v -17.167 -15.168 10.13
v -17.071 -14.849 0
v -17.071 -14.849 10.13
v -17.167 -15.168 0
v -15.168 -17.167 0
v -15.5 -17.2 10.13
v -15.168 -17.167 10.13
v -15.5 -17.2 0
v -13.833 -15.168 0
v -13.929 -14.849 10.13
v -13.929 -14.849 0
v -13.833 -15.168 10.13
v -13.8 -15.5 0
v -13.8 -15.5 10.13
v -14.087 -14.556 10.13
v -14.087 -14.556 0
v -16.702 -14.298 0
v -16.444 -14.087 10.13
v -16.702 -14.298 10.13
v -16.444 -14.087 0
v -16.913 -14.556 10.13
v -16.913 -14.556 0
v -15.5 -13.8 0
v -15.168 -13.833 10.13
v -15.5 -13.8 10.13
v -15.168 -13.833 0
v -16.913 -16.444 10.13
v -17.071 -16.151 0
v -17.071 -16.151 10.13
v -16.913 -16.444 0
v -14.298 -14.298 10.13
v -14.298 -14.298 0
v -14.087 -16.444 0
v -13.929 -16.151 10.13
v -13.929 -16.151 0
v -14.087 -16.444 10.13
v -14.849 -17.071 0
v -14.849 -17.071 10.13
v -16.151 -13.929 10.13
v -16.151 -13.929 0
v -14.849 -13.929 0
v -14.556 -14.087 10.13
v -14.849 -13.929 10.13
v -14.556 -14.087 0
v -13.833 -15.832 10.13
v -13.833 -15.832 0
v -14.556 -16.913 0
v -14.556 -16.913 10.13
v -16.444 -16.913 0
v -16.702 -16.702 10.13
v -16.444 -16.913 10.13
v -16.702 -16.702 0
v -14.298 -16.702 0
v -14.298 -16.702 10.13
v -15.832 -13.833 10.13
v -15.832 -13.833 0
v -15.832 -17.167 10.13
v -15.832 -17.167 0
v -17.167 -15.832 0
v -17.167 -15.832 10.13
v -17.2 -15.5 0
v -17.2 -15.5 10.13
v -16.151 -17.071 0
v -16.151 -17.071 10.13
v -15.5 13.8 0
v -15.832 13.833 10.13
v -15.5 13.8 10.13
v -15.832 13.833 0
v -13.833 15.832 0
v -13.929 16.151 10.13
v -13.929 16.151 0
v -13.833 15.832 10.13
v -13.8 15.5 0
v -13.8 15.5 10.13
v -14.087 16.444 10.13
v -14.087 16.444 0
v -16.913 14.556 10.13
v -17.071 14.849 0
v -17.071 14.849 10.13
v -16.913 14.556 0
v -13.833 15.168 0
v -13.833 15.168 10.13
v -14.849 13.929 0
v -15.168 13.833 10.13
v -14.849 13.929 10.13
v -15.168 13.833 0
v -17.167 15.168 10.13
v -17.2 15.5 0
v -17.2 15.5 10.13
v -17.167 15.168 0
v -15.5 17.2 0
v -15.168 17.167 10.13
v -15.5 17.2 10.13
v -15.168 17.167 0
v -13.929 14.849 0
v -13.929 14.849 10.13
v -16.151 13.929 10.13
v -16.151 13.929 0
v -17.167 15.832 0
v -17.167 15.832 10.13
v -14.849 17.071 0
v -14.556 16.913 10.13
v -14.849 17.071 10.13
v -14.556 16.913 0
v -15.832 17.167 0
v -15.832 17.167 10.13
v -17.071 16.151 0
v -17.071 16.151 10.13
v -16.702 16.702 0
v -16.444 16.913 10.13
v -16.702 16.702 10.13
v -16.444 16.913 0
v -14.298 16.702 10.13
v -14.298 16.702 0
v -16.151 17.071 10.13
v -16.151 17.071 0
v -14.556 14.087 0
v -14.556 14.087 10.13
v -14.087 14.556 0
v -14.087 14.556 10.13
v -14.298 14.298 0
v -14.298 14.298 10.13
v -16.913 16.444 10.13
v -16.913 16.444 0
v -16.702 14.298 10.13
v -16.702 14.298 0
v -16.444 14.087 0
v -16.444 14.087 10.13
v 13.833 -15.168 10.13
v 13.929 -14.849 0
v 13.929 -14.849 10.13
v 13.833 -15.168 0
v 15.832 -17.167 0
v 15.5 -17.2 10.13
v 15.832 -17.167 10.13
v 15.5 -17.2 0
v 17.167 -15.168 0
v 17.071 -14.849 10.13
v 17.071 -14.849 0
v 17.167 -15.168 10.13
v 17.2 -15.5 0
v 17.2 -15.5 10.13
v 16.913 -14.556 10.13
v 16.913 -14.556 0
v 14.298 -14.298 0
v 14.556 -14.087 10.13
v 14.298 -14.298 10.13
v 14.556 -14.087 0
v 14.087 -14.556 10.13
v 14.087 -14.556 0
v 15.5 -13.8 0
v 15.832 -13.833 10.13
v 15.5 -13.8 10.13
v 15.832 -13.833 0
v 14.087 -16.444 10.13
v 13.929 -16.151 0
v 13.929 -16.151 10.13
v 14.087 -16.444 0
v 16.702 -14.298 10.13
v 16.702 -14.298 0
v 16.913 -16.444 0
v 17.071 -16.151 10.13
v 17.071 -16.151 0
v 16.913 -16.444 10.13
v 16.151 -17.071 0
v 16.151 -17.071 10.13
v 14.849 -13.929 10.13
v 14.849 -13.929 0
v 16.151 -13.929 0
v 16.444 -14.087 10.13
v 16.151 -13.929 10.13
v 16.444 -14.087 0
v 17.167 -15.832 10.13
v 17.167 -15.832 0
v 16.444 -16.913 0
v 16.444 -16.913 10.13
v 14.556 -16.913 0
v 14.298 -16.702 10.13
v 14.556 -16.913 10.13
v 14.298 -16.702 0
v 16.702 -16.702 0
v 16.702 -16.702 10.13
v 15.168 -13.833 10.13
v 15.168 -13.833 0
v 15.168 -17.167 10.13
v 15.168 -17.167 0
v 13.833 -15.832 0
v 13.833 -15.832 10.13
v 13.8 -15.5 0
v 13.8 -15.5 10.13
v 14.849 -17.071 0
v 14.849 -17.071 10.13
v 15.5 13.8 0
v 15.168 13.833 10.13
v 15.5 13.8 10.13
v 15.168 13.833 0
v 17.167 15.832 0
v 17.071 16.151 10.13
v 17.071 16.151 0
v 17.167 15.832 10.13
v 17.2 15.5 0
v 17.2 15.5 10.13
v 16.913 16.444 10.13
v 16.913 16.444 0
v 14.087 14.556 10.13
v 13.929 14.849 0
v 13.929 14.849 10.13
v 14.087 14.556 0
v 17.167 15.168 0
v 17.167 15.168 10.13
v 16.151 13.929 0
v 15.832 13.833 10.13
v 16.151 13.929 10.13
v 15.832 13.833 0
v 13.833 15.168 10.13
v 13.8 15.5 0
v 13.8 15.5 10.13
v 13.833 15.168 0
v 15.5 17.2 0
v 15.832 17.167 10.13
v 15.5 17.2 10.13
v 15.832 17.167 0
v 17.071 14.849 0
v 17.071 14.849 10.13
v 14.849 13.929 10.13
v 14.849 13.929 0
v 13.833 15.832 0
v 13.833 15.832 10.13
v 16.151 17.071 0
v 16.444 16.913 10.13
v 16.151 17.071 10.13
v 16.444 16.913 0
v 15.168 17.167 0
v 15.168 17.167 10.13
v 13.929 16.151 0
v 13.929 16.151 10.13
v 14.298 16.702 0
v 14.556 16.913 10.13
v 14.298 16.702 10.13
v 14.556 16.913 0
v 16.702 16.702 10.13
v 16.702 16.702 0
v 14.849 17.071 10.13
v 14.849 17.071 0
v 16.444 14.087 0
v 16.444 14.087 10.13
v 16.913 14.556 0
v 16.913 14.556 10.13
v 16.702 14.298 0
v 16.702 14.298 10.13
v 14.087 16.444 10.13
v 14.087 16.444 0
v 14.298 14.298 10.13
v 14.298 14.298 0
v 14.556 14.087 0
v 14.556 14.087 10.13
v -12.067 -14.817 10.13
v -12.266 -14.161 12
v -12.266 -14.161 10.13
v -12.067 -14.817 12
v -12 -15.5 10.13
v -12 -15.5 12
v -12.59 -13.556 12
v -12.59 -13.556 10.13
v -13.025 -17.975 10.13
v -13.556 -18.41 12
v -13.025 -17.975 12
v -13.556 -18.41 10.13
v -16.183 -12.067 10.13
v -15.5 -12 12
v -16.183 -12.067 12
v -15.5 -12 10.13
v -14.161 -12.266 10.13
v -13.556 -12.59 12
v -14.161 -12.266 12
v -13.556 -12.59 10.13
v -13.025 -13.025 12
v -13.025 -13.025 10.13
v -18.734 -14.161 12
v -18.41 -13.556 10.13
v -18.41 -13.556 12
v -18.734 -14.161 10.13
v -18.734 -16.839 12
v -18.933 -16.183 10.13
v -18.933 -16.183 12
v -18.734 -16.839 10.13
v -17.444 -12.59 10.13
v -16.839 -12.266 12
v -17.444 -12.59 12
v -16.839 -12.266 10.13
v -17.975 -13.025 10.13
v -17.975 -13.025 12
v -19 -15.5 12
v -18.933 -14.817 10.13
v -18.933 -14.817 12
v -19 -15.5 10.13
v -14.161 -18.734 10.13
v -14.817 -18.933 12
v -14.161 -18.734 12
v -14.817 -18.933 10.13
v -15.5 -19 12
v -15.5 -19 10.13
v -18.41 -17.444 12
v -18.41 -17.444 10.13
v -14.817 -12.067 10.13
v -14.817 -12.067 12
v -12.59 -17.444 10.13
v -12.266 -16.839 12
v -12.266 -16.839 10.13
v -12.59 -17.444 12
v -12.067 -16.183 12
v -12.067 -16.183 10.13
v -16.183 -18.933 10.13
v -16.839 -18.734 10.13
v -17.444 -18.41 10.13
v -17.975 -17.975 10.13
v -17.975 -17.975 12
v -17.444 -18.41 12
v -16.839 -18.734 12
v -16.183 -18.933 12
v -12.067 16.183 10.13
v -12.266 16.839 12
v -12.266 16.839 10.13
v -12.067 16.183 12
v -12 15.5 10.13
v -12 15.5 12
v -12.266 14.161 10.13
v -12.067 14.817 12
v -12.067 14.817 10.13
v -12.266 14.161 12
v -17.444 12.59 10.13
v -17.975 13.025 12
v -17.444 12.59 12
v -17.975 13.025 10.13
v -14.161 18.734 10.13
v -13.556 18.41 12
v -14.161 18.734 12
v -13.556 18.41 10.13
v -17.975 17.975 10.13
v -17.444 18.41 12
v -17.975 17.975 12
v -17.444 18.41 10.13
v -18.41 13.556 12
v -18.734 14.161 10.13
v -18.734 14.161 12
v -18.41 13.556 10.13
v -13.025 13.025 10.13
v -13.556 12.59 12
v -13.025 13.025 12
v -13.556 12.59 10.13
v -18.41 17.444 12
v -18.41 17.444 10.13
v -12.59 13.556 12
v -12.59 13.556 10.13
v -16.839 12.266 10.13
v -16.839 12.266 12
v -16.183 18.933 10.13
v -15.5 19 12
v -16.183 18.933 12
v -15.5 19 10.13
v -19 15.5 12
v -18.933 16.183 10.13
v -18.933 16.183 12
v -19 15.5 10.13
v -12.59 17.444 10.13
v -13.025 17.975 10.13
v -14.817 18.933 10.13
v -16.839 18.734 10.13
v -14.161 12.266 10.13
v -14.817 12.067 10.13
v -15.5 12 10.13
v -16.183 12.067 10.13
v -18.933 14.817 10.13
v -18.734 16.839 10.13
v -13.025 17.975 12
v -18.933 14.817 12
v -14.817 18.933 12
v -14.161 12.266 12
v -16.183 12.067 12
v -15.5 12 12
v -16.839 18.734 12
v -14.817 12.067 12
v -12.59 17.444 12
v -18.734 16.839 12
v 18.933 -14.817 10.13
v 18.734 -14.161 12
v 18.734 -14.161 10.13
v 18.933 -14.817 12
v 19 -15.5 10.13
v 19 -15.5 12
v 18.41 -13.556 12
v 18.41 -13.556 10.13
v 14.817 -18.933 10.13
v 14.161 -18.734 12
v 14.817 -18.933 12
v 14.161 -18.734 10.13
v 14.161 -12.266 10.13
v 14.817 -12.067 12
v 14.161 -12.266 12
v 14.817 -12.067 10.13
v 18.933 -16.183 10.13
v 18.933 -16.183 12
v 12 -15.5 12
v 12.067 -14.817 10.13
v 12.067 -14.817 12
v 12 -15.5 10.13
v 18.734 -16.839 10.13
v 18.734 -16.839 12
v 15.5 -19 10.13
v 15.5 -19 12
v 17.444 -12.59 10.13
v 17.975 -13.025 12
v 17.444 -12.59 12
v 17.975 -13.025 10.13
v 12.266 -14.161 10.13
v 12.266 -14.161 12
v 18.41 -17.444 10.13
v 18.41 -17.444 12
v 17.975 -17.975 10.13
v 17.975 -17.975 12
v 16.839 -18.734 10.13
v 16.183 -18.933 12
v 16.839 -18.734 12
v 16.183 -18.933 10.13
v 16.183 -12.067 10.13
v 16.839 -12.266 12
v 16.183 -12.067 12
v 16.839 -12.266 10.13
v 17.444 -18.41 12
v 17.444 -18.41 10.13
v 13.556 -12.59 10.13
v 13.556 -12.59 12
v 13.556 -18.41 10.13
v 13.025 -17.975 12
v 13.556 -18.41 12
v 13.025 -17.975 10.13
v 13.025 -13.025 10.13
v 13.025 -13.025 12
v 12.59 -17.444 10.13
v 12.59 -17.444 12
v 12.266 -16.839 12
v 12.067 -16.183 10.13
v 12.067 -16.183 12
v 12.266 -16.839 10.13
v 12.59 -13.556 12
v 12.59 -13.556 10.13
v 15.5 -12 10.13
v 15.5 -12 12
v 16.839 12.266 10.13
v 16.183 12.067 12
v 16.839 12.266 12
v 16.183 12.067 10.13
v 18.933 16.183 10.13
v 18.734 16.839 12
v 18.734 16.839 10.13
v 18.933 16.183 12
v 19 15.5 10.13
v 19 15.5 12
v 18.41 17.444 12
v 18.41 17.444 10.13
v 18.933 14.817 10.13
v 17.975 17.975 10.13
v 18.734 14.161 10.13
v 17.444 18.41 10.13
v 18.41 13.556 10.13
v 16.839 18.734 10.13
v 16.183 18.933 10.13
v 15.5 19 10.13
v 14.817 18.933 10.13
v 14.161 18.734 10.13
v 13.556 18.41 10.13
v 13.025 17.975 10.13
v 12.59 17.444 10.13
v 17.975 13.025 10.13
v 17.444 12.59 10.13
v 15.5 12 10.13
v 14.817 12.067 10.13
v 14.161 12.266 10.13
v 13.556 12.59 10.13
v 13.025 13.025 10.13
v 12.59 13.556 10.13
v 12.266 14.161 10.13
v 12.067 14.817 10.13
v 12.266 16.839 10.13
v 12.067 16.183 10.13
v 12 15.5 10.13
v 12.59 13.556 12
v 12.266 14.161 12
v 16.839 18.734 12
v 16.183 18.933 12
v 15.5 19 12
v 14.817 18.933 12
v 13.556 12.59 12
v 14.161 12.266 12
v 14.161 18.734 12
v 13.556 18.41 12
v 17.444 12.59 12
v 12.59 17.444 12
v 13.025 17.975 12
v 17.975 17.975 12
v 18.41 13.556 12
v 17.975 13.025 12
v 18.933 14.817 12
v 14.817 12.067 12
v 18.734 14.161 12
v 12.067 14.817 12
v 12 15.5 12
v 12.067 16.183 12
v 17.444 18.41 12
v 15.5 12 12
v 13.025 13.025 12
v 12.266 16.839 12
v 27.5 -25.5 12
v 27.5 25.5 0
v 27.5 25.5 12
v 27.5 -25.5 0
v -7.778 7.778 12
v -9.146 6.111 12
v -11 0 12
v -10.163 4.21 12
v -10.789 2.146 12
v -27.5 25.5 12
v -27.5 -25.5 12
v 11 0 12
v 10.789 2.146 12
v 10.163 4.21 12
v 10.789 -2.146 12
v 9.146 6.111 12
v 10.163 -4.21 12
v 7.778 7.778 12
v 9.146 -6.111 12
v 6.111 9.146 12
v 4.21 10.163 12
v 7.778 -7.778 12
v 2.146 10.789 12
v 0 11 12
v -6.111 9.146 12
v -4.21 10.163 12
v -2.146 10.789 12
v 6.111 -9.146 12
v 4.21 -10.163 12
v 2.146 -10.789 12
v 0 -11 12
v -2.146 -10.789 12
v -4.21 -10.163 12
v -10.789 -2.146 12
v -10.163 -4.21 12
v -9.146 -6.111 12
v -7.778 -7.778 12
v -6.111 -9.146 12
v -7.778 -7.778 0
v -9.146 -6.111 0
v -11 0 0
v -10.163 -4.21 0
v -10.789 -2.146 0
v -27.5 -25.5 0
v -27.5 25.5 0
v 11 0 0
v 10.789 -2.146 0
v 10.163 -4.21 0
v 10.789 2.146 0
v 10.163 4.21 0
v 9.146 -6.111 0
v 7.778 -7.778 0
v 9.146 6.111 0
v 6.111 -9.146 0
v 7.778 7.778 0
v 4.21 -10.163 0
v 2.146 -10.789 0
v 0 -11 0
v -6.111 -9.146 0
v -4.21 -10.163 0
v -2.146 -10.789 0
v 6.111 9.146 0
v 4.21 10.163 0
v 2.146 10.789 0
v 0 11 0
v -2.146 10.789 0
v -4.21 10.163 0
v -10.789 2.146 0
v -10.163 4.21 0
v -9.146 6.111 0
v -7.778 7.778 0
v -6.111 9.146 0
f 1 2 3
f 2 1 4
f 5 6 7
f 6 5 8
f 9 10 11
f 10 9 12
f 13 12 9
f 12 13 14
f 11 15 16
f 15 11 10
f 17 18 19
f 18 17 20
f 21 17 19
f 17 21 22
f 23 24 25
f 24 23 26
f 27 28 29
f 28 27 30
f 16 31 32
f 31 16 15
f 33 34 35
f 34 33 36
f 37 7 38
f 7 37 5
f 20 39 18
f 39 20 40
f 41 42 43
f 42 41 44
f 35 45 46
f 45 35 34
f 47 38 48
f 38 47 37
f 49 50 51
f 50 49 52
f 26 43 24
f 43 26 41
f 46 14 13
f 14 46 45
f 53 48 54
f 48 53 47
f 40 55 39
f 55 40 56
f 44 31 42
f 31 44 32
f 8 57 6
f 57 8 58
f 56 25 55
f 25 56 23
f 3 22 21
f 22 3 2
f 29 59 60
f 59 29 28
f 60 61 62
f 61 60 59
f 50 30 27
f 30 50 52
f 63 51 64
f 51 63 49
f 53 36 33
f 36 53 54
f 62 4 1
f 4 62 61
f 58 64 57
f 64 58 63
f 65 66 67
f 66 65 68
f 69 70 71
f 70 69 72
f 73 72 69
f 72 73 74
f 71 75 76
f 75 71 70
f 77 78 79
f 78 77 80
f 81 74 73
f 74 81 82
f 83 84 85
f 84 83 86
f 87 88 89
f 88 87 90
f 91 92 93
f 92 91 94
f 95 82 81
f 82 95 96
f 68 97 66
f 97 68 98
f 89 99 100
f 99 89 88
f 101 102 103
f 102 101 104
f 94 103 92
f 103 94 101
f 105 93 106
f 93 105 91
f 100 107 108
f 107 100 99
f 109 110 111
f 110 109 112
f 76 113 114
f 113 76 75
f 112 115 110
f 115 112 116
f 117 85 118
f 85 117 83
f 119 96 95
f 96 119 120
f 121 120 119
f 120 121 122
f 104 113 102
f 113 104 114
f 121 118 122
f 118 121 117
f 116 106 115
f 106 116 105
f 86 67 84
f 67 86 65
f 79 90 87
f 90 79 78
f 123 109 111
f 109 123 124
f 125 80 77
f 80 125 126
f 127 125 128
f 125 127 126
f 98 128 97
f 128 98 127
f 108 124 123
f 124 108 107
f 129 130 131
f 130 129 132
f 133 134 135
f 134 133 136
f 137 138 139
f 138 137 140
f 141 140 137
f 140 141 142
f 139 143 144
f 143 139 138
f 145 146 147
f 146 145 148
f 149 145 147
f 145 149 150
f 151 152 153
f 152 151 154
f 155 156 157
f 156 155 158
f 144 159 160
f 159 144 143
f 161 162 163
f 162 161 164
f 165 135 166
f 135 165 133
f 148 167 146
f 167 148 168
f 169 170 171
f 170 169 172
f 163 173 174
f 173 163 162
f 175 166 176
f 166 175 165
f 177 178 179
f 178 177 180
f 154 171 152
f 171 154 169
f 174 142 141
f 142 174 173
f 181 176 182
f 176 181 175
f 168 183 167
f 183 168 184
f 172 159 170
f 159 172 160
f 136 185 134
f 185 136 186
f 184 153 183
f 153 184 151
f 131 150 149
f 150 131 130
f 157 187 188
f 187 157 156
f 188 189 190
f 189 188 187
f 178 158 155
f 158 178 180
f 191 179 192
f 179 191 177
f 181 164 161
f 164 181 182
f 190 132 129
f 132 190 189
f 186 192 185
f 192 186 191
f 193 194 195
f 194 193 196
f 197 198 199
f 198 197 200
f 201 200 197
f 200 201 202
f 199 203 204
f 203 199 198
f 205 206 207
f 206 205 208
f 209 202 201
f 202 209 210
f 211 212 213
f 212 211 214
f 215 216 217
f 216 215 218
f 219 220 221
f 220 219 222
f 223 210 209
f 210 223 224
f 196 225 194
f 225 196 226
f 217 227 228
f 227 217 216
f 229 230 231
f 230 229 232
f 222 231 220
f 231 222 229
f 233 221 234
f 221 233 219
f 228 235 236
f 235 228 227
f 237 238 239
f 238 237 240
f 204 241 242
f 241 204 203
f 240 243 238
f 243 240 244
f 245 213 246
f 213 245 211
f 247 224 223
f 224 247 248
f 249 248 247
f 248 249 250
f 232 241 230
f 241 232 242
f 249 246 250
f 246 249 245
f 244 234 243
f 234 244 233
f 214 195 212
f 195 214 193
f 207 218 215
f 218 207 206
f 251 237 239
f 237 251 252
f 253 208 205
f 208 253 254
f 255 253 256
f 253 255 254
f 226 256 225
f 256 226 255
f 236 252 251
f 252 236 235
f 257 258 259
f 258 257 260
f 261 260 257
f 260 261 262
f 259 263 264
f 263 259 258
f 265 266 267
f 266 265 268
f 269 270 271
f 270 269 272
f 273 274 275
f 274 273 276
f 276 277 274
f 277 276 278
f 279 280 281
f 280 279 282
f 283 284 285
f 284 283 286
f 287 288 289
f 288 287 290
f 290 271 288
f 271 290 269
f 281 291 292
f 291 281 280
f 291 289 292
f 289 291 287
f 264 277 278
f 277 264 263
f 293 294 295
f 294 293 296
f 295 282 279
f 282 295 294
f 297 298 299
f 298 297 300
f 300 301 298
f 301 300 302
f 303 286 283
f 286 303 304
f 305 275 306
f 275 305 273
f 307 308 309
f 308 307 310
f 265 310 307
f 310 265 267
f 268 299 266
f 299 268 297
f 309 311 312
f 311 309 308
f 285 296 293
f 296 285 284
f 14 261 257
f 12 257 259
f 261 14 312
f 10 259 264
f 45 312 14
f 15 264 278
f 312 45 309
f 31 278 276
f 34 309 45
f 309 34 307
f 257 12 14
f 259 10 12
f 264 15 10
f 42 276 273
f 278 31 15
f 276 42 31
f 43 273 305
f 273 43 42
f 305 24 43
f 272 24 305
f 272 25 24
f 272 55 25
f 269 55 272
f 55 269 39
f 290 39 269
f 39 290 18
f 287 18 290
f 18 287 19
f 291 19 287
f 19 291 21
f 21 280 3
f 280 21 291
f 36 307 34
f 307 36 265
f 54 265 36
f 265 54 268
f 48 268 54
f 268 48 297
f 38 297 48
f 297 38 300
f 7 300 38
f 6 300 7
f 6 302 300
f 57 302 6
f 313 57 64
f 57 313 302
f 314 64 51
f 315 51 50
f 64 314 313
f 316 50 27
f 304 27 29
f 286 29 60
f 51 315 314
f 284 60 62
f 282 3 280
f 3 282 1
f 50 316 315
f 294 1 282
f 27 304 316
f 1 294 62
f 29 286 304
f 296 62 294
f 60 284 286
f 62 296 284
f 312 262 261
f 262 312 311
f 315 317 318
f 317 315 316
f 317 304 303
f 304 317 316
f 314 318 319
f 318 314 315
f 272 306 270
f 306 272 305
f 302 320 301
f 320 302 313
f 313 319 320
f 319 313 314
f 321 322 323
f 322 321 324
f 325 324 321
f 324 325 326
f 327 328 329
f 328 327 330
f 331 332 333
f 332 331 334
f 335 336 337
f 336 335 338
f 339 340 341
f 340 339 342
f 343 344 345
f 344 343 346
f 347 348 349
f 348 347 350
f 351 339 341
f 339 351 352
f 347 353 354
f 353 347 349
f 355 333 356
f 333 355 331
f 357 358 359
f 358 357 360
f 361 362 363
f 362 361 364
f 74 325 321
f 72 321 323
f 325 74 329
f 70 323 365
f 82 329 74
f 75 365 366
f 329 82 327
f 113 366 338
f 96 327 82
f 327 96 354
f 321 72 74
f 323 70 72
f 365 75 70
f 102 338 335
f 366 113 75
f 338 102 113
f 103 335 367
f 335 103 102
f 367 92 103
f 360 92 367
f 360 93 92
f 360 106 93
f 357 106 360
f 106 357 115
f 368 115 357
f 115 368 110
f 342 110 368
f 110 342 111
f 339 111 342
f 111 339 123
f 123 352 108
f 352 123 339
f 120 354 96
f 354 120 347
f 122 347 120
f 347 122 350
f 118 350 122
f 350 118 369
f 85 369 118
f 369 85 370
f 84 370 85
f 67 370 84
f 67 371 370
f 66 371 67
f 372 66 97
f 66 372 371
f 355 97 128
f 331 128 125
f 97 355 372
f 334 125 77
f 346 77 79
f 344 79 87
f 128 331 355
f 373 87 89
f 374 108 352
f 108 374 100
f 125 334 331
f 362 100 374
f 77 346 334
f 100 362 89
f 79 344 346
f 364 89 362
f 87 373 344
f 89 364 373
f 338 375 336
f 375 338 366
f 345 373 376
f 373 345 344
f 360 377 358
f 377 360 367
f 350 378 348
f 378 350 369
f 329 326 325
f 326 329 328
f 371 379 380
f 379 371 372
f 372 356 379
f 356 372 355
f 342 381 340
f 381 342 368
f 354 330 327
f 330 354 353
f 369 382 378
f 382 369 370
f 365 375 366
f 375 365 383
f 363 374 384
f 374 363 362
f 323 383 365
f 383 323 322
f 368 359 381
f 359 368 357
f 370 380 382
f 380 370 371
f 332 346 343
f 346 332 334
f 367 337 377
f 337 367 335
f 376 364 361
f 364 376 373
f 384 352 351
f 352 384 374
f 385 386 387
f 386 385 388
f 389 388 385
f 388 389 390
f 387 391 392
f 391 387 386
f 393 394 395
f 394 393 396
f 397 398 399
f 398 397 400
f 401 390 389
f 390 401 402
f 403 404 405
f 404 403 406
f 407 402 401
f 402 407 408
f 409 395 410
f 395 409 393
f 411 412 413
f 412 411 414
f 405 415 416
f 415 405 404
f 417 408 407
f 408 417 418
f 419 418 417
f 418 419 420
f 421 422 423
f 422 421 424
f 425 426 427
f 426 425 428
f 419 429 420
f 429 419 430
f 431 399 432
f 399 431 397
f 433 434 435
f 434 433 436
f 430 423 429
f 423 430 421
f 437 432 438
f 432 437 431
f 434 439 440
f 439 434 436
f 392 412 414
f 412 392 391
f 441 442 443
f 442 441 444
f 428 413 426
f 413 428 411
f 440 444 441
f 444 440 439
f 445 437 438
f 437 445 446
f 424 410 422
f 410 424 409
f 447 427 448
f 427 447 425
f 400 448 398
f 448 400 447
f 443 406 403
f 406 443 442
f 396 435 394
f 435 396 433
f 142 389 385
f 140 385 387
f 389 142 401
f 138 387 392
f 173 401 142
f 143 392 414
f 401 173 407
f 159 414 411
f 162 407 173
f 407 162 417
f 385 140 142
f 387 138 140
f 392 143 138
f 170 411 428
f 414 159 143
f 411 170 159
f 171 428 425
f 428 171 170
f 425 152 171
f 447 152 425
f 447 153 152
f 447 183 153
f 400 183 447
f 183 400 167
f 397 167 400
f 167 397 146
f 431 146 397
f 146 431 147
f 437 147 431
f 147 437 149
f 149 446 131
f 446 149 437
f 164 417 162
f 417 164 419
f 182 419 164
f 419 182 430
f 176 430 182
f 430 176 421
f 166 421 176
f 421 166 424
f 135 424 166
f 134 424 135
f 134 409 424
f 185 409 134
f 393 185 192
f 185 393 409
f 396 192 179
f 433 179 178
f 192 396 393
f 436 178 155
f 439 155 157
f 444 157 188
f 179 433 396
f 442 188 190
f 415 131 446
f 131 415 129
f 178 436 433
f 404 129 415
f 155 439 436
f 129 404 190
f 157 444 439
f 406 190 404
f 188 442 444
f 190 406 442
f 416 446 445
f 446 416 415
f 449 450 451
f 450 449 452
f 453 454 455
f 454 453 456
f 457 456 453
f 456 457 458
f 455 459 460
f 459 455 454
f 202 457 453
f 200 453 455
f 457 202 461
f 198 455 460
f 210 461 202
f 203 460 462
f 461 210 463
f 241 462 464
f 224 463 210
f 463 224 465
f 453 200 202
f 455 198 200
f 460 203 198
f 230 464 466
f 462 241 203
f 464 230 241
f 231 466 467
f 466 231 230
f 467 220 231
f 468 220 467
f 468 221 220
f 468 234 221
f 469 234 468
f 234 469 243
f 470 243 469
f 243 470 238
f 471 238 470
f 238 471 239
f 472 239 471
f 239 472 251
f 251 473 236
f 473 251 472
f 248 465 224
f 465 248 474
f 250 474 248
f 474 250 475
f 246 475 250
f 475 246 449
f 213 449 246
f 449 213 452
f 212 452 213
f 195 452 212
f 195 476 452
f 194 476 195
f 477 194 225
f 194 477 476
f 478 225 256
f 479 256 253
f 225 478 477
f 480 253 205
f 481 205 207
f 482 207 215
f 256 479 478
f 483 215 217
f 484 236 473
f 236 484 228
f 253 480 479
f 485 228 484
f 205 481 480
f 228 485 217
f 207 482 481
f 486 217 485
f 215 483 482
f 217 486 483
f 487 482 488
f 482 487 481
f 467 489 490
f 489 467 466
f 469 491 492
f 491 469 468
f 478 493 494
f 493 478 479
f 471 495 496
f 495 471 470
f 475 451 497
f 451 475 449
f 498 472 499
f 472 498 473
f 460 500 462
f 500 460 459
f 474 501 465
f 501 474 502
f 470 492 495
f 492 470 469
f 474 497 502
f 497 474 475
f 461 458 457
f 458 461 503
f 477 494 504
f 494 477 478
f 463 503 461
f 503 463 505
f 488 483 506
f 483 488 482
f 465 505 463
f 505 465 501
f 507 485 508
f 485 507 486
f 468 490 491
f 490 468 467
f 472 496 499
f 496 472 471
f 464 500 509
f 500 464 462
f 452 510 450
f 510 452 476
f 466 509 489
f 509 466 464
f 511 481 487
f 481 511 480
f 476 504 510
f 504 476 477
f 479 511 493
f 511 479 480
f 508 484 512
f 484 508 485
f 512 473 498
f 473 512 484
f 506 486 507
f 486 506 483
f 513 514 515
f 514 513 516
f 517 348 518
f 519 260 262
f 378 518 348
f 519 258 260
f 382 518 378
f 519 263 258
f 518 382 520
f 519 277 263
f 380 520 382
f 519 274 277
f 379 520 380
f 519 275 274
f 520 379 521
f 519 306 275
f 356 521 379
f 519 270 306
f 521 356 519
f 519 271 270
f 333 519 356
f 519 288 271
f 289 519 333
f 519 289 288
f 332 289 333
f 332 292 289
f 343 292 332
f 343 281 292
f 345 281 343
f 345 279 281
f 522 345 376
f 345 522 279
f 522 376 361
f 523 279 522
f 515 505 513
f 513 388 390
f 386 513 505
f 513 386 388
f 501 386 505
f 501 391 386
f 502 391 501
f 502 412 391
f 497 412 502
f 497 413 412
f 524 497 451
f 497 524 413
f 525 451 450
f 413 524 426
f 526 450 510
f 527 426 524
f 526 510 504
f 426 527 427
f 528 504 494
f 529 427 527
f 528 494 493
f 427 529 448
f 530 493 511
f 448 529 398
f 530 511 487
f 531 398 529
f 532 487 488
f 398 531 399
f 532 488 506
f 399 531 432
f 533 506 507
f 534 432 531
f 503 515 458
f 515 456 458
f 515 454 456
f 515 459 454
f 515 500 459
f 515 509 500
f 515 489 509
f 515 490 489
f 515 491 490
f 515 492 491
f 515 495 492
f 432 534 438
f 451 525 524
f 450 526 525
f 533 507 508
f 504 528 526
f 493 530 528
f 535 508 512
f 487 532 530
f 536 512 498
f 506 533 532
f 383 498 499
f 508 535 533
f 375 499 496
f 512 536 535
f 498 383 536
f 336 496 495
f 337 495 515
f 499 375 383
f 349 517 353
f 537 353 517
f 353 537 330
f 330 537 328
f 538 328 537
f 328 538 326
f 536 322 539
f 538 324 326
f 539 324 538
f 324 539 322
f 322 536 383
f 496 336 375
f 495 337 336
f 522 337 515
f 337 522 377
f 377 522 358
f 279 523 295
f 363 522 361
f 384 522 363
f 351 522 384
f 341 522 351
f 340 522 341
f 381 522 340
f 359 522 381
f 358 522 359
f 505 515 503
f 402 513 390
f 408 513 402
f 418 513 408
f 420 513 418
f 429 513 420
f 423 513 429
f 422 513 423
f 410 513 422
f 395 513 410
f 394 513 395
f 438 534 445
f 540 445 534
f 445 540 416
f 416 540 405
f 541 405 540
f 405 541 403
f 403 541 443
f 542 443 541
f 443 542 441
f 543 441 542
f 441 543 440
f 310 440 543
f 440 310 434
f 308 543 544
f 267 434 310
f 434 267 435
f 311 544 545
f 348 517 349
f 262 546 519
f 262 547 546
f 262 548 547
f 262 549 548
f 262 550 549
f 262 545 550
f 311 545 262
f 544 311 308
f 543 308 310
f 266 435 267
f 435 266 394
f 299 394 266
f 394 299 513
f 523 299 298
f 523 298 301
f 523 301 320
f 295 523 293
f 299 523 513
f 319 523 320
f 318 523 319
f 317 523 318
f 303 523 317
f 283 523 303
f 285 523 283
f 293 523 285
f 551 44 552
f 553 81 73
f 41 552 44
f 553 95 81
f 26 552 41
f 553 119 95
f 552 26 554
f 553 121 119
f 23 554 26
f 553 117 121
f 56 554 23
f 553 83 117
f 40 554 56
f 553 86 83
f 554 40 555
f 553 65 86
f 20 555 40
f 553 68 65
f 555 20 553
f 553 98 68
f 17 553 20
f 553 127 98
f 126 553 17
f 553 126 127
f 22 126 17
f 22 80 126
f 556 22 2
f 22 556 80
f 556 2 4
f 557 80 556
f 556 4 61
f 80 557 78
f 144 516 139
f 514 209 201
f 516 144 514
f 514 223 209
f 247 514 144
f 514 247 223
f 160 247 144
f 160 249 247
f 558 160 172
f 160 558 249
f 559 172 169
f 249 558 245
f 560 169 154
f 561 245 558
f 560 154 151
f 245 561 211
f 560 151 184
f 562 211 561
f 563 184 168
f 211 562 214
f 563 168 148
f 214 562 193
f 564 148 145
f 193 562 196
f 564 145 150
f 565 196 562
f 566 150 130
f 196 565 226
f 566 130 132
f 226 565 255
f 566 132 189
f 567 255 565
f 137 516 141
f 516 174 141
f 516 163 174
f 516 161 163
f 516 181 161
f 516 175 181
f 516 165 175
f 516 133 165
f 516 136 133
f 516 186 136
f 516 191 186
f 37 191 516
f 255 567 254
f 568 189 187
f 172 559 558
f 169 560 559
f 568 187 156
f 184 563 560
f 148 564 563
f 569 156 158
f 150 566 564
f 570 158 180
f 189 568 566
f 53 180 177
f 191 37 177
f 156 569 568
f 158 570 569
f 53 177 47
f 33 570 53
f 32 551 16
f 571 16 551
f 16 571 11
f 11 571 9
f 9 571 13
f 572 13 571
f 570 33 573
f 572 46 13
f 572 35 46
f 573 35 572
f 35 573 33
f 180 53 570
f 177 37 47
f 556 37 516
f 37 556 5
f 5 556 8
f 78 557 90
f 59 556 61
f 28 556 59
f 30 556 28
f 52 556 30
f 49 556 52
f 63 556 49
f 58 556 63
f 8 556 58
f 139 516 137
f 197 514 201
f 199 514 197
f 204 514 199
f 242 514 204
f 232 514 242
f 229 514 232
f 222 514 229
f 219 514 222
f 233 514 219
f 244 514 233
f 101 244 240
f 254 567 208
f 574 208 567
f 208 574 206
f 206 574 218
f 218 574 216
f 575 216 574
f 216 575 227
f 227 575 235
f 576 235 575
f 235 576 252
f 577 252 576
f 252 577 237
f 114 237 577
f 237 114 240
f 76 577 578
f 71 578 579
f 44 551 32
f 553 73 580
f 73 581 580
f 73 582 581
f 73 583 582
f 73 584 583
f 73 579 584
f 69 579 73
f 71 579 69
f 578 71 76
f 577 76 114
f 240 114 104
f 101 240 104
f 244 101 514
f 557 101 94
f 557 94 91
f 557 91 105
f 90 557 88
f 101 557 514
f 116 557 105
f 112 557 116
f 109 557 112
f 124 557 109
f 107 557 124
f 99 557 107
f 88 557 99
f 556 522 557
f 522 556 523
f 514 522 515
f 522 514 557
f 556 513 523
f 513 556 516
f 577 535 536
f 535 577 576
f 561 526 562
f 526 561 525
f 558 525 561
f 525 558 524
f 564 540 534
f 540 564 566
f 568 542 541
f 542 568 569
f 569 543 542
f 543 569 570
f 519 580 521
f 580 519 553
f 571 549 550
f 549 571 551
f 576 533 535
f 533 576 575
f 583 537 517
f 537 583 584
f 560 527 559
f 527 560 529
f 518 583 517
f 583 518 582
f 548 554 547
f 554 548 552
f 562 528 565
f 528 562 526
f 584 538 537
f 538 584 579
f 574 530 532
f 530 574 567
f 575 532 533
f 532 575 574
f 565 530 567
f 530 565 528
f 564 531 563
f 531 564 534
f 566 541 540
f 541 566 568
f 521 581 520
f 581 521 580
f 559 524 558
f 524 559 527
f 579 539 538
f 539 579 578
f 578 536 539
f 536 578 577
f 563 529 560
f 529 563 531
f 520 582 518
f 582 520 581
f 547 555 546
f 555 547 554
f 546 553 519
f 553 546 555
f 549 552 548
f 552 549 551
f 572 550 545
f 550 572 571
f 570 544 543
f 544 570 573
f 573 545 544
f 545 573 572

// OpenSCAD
$fn = 32;

// ----------------------------------------------------------------------
// Motor mount plate: NEMA17, 55 x 51 x 12 mm
// ----------------------------------------------------------------------

// --- parameters (mm) ---
plate_w = 55;             // plate length, X
plate_d = 51;             // plate width, Y
plate_t = 12;             // plate thickness
pattern = 31;             // NEMA17 bolt spacing
motor_d = 3.4;            // NEMA17 screw clearance
pilot_d = 22;             // pilot boss bore
cb_d = 7;                 // counterbore seat
cb_h = 1.87;              // counterbore depth

module plate() {
  translate([-plate_w / 2, -plate_d / 2, 0]) cube([plate_w, plate_d, plate_t]);
}

module motor_holes() {
  for (sx = [-1, 1]) for (sy = [-1, 1])
    translate([sx * pattern / 2, sy * pattern / 2, -1])
      cylinder(h = plate_t + 2, d = motor_d);
}
module motor_counterbores() {
  for (sx = [-1, 1]) for (sy = [-1, 1])
    translate([sx * pattern / 2, sy * pattern / 2, plate_t - cb_h])
      cylinder(h = cb_h + 0.6, d = cb_d);
}

difference() {
  union() {
    plate();
  }
  motor_holes();
  translate([0, 0, -1]) cylinder(h = plate_t + 2, d = pilot_d);
  motor_counterbores();
}
